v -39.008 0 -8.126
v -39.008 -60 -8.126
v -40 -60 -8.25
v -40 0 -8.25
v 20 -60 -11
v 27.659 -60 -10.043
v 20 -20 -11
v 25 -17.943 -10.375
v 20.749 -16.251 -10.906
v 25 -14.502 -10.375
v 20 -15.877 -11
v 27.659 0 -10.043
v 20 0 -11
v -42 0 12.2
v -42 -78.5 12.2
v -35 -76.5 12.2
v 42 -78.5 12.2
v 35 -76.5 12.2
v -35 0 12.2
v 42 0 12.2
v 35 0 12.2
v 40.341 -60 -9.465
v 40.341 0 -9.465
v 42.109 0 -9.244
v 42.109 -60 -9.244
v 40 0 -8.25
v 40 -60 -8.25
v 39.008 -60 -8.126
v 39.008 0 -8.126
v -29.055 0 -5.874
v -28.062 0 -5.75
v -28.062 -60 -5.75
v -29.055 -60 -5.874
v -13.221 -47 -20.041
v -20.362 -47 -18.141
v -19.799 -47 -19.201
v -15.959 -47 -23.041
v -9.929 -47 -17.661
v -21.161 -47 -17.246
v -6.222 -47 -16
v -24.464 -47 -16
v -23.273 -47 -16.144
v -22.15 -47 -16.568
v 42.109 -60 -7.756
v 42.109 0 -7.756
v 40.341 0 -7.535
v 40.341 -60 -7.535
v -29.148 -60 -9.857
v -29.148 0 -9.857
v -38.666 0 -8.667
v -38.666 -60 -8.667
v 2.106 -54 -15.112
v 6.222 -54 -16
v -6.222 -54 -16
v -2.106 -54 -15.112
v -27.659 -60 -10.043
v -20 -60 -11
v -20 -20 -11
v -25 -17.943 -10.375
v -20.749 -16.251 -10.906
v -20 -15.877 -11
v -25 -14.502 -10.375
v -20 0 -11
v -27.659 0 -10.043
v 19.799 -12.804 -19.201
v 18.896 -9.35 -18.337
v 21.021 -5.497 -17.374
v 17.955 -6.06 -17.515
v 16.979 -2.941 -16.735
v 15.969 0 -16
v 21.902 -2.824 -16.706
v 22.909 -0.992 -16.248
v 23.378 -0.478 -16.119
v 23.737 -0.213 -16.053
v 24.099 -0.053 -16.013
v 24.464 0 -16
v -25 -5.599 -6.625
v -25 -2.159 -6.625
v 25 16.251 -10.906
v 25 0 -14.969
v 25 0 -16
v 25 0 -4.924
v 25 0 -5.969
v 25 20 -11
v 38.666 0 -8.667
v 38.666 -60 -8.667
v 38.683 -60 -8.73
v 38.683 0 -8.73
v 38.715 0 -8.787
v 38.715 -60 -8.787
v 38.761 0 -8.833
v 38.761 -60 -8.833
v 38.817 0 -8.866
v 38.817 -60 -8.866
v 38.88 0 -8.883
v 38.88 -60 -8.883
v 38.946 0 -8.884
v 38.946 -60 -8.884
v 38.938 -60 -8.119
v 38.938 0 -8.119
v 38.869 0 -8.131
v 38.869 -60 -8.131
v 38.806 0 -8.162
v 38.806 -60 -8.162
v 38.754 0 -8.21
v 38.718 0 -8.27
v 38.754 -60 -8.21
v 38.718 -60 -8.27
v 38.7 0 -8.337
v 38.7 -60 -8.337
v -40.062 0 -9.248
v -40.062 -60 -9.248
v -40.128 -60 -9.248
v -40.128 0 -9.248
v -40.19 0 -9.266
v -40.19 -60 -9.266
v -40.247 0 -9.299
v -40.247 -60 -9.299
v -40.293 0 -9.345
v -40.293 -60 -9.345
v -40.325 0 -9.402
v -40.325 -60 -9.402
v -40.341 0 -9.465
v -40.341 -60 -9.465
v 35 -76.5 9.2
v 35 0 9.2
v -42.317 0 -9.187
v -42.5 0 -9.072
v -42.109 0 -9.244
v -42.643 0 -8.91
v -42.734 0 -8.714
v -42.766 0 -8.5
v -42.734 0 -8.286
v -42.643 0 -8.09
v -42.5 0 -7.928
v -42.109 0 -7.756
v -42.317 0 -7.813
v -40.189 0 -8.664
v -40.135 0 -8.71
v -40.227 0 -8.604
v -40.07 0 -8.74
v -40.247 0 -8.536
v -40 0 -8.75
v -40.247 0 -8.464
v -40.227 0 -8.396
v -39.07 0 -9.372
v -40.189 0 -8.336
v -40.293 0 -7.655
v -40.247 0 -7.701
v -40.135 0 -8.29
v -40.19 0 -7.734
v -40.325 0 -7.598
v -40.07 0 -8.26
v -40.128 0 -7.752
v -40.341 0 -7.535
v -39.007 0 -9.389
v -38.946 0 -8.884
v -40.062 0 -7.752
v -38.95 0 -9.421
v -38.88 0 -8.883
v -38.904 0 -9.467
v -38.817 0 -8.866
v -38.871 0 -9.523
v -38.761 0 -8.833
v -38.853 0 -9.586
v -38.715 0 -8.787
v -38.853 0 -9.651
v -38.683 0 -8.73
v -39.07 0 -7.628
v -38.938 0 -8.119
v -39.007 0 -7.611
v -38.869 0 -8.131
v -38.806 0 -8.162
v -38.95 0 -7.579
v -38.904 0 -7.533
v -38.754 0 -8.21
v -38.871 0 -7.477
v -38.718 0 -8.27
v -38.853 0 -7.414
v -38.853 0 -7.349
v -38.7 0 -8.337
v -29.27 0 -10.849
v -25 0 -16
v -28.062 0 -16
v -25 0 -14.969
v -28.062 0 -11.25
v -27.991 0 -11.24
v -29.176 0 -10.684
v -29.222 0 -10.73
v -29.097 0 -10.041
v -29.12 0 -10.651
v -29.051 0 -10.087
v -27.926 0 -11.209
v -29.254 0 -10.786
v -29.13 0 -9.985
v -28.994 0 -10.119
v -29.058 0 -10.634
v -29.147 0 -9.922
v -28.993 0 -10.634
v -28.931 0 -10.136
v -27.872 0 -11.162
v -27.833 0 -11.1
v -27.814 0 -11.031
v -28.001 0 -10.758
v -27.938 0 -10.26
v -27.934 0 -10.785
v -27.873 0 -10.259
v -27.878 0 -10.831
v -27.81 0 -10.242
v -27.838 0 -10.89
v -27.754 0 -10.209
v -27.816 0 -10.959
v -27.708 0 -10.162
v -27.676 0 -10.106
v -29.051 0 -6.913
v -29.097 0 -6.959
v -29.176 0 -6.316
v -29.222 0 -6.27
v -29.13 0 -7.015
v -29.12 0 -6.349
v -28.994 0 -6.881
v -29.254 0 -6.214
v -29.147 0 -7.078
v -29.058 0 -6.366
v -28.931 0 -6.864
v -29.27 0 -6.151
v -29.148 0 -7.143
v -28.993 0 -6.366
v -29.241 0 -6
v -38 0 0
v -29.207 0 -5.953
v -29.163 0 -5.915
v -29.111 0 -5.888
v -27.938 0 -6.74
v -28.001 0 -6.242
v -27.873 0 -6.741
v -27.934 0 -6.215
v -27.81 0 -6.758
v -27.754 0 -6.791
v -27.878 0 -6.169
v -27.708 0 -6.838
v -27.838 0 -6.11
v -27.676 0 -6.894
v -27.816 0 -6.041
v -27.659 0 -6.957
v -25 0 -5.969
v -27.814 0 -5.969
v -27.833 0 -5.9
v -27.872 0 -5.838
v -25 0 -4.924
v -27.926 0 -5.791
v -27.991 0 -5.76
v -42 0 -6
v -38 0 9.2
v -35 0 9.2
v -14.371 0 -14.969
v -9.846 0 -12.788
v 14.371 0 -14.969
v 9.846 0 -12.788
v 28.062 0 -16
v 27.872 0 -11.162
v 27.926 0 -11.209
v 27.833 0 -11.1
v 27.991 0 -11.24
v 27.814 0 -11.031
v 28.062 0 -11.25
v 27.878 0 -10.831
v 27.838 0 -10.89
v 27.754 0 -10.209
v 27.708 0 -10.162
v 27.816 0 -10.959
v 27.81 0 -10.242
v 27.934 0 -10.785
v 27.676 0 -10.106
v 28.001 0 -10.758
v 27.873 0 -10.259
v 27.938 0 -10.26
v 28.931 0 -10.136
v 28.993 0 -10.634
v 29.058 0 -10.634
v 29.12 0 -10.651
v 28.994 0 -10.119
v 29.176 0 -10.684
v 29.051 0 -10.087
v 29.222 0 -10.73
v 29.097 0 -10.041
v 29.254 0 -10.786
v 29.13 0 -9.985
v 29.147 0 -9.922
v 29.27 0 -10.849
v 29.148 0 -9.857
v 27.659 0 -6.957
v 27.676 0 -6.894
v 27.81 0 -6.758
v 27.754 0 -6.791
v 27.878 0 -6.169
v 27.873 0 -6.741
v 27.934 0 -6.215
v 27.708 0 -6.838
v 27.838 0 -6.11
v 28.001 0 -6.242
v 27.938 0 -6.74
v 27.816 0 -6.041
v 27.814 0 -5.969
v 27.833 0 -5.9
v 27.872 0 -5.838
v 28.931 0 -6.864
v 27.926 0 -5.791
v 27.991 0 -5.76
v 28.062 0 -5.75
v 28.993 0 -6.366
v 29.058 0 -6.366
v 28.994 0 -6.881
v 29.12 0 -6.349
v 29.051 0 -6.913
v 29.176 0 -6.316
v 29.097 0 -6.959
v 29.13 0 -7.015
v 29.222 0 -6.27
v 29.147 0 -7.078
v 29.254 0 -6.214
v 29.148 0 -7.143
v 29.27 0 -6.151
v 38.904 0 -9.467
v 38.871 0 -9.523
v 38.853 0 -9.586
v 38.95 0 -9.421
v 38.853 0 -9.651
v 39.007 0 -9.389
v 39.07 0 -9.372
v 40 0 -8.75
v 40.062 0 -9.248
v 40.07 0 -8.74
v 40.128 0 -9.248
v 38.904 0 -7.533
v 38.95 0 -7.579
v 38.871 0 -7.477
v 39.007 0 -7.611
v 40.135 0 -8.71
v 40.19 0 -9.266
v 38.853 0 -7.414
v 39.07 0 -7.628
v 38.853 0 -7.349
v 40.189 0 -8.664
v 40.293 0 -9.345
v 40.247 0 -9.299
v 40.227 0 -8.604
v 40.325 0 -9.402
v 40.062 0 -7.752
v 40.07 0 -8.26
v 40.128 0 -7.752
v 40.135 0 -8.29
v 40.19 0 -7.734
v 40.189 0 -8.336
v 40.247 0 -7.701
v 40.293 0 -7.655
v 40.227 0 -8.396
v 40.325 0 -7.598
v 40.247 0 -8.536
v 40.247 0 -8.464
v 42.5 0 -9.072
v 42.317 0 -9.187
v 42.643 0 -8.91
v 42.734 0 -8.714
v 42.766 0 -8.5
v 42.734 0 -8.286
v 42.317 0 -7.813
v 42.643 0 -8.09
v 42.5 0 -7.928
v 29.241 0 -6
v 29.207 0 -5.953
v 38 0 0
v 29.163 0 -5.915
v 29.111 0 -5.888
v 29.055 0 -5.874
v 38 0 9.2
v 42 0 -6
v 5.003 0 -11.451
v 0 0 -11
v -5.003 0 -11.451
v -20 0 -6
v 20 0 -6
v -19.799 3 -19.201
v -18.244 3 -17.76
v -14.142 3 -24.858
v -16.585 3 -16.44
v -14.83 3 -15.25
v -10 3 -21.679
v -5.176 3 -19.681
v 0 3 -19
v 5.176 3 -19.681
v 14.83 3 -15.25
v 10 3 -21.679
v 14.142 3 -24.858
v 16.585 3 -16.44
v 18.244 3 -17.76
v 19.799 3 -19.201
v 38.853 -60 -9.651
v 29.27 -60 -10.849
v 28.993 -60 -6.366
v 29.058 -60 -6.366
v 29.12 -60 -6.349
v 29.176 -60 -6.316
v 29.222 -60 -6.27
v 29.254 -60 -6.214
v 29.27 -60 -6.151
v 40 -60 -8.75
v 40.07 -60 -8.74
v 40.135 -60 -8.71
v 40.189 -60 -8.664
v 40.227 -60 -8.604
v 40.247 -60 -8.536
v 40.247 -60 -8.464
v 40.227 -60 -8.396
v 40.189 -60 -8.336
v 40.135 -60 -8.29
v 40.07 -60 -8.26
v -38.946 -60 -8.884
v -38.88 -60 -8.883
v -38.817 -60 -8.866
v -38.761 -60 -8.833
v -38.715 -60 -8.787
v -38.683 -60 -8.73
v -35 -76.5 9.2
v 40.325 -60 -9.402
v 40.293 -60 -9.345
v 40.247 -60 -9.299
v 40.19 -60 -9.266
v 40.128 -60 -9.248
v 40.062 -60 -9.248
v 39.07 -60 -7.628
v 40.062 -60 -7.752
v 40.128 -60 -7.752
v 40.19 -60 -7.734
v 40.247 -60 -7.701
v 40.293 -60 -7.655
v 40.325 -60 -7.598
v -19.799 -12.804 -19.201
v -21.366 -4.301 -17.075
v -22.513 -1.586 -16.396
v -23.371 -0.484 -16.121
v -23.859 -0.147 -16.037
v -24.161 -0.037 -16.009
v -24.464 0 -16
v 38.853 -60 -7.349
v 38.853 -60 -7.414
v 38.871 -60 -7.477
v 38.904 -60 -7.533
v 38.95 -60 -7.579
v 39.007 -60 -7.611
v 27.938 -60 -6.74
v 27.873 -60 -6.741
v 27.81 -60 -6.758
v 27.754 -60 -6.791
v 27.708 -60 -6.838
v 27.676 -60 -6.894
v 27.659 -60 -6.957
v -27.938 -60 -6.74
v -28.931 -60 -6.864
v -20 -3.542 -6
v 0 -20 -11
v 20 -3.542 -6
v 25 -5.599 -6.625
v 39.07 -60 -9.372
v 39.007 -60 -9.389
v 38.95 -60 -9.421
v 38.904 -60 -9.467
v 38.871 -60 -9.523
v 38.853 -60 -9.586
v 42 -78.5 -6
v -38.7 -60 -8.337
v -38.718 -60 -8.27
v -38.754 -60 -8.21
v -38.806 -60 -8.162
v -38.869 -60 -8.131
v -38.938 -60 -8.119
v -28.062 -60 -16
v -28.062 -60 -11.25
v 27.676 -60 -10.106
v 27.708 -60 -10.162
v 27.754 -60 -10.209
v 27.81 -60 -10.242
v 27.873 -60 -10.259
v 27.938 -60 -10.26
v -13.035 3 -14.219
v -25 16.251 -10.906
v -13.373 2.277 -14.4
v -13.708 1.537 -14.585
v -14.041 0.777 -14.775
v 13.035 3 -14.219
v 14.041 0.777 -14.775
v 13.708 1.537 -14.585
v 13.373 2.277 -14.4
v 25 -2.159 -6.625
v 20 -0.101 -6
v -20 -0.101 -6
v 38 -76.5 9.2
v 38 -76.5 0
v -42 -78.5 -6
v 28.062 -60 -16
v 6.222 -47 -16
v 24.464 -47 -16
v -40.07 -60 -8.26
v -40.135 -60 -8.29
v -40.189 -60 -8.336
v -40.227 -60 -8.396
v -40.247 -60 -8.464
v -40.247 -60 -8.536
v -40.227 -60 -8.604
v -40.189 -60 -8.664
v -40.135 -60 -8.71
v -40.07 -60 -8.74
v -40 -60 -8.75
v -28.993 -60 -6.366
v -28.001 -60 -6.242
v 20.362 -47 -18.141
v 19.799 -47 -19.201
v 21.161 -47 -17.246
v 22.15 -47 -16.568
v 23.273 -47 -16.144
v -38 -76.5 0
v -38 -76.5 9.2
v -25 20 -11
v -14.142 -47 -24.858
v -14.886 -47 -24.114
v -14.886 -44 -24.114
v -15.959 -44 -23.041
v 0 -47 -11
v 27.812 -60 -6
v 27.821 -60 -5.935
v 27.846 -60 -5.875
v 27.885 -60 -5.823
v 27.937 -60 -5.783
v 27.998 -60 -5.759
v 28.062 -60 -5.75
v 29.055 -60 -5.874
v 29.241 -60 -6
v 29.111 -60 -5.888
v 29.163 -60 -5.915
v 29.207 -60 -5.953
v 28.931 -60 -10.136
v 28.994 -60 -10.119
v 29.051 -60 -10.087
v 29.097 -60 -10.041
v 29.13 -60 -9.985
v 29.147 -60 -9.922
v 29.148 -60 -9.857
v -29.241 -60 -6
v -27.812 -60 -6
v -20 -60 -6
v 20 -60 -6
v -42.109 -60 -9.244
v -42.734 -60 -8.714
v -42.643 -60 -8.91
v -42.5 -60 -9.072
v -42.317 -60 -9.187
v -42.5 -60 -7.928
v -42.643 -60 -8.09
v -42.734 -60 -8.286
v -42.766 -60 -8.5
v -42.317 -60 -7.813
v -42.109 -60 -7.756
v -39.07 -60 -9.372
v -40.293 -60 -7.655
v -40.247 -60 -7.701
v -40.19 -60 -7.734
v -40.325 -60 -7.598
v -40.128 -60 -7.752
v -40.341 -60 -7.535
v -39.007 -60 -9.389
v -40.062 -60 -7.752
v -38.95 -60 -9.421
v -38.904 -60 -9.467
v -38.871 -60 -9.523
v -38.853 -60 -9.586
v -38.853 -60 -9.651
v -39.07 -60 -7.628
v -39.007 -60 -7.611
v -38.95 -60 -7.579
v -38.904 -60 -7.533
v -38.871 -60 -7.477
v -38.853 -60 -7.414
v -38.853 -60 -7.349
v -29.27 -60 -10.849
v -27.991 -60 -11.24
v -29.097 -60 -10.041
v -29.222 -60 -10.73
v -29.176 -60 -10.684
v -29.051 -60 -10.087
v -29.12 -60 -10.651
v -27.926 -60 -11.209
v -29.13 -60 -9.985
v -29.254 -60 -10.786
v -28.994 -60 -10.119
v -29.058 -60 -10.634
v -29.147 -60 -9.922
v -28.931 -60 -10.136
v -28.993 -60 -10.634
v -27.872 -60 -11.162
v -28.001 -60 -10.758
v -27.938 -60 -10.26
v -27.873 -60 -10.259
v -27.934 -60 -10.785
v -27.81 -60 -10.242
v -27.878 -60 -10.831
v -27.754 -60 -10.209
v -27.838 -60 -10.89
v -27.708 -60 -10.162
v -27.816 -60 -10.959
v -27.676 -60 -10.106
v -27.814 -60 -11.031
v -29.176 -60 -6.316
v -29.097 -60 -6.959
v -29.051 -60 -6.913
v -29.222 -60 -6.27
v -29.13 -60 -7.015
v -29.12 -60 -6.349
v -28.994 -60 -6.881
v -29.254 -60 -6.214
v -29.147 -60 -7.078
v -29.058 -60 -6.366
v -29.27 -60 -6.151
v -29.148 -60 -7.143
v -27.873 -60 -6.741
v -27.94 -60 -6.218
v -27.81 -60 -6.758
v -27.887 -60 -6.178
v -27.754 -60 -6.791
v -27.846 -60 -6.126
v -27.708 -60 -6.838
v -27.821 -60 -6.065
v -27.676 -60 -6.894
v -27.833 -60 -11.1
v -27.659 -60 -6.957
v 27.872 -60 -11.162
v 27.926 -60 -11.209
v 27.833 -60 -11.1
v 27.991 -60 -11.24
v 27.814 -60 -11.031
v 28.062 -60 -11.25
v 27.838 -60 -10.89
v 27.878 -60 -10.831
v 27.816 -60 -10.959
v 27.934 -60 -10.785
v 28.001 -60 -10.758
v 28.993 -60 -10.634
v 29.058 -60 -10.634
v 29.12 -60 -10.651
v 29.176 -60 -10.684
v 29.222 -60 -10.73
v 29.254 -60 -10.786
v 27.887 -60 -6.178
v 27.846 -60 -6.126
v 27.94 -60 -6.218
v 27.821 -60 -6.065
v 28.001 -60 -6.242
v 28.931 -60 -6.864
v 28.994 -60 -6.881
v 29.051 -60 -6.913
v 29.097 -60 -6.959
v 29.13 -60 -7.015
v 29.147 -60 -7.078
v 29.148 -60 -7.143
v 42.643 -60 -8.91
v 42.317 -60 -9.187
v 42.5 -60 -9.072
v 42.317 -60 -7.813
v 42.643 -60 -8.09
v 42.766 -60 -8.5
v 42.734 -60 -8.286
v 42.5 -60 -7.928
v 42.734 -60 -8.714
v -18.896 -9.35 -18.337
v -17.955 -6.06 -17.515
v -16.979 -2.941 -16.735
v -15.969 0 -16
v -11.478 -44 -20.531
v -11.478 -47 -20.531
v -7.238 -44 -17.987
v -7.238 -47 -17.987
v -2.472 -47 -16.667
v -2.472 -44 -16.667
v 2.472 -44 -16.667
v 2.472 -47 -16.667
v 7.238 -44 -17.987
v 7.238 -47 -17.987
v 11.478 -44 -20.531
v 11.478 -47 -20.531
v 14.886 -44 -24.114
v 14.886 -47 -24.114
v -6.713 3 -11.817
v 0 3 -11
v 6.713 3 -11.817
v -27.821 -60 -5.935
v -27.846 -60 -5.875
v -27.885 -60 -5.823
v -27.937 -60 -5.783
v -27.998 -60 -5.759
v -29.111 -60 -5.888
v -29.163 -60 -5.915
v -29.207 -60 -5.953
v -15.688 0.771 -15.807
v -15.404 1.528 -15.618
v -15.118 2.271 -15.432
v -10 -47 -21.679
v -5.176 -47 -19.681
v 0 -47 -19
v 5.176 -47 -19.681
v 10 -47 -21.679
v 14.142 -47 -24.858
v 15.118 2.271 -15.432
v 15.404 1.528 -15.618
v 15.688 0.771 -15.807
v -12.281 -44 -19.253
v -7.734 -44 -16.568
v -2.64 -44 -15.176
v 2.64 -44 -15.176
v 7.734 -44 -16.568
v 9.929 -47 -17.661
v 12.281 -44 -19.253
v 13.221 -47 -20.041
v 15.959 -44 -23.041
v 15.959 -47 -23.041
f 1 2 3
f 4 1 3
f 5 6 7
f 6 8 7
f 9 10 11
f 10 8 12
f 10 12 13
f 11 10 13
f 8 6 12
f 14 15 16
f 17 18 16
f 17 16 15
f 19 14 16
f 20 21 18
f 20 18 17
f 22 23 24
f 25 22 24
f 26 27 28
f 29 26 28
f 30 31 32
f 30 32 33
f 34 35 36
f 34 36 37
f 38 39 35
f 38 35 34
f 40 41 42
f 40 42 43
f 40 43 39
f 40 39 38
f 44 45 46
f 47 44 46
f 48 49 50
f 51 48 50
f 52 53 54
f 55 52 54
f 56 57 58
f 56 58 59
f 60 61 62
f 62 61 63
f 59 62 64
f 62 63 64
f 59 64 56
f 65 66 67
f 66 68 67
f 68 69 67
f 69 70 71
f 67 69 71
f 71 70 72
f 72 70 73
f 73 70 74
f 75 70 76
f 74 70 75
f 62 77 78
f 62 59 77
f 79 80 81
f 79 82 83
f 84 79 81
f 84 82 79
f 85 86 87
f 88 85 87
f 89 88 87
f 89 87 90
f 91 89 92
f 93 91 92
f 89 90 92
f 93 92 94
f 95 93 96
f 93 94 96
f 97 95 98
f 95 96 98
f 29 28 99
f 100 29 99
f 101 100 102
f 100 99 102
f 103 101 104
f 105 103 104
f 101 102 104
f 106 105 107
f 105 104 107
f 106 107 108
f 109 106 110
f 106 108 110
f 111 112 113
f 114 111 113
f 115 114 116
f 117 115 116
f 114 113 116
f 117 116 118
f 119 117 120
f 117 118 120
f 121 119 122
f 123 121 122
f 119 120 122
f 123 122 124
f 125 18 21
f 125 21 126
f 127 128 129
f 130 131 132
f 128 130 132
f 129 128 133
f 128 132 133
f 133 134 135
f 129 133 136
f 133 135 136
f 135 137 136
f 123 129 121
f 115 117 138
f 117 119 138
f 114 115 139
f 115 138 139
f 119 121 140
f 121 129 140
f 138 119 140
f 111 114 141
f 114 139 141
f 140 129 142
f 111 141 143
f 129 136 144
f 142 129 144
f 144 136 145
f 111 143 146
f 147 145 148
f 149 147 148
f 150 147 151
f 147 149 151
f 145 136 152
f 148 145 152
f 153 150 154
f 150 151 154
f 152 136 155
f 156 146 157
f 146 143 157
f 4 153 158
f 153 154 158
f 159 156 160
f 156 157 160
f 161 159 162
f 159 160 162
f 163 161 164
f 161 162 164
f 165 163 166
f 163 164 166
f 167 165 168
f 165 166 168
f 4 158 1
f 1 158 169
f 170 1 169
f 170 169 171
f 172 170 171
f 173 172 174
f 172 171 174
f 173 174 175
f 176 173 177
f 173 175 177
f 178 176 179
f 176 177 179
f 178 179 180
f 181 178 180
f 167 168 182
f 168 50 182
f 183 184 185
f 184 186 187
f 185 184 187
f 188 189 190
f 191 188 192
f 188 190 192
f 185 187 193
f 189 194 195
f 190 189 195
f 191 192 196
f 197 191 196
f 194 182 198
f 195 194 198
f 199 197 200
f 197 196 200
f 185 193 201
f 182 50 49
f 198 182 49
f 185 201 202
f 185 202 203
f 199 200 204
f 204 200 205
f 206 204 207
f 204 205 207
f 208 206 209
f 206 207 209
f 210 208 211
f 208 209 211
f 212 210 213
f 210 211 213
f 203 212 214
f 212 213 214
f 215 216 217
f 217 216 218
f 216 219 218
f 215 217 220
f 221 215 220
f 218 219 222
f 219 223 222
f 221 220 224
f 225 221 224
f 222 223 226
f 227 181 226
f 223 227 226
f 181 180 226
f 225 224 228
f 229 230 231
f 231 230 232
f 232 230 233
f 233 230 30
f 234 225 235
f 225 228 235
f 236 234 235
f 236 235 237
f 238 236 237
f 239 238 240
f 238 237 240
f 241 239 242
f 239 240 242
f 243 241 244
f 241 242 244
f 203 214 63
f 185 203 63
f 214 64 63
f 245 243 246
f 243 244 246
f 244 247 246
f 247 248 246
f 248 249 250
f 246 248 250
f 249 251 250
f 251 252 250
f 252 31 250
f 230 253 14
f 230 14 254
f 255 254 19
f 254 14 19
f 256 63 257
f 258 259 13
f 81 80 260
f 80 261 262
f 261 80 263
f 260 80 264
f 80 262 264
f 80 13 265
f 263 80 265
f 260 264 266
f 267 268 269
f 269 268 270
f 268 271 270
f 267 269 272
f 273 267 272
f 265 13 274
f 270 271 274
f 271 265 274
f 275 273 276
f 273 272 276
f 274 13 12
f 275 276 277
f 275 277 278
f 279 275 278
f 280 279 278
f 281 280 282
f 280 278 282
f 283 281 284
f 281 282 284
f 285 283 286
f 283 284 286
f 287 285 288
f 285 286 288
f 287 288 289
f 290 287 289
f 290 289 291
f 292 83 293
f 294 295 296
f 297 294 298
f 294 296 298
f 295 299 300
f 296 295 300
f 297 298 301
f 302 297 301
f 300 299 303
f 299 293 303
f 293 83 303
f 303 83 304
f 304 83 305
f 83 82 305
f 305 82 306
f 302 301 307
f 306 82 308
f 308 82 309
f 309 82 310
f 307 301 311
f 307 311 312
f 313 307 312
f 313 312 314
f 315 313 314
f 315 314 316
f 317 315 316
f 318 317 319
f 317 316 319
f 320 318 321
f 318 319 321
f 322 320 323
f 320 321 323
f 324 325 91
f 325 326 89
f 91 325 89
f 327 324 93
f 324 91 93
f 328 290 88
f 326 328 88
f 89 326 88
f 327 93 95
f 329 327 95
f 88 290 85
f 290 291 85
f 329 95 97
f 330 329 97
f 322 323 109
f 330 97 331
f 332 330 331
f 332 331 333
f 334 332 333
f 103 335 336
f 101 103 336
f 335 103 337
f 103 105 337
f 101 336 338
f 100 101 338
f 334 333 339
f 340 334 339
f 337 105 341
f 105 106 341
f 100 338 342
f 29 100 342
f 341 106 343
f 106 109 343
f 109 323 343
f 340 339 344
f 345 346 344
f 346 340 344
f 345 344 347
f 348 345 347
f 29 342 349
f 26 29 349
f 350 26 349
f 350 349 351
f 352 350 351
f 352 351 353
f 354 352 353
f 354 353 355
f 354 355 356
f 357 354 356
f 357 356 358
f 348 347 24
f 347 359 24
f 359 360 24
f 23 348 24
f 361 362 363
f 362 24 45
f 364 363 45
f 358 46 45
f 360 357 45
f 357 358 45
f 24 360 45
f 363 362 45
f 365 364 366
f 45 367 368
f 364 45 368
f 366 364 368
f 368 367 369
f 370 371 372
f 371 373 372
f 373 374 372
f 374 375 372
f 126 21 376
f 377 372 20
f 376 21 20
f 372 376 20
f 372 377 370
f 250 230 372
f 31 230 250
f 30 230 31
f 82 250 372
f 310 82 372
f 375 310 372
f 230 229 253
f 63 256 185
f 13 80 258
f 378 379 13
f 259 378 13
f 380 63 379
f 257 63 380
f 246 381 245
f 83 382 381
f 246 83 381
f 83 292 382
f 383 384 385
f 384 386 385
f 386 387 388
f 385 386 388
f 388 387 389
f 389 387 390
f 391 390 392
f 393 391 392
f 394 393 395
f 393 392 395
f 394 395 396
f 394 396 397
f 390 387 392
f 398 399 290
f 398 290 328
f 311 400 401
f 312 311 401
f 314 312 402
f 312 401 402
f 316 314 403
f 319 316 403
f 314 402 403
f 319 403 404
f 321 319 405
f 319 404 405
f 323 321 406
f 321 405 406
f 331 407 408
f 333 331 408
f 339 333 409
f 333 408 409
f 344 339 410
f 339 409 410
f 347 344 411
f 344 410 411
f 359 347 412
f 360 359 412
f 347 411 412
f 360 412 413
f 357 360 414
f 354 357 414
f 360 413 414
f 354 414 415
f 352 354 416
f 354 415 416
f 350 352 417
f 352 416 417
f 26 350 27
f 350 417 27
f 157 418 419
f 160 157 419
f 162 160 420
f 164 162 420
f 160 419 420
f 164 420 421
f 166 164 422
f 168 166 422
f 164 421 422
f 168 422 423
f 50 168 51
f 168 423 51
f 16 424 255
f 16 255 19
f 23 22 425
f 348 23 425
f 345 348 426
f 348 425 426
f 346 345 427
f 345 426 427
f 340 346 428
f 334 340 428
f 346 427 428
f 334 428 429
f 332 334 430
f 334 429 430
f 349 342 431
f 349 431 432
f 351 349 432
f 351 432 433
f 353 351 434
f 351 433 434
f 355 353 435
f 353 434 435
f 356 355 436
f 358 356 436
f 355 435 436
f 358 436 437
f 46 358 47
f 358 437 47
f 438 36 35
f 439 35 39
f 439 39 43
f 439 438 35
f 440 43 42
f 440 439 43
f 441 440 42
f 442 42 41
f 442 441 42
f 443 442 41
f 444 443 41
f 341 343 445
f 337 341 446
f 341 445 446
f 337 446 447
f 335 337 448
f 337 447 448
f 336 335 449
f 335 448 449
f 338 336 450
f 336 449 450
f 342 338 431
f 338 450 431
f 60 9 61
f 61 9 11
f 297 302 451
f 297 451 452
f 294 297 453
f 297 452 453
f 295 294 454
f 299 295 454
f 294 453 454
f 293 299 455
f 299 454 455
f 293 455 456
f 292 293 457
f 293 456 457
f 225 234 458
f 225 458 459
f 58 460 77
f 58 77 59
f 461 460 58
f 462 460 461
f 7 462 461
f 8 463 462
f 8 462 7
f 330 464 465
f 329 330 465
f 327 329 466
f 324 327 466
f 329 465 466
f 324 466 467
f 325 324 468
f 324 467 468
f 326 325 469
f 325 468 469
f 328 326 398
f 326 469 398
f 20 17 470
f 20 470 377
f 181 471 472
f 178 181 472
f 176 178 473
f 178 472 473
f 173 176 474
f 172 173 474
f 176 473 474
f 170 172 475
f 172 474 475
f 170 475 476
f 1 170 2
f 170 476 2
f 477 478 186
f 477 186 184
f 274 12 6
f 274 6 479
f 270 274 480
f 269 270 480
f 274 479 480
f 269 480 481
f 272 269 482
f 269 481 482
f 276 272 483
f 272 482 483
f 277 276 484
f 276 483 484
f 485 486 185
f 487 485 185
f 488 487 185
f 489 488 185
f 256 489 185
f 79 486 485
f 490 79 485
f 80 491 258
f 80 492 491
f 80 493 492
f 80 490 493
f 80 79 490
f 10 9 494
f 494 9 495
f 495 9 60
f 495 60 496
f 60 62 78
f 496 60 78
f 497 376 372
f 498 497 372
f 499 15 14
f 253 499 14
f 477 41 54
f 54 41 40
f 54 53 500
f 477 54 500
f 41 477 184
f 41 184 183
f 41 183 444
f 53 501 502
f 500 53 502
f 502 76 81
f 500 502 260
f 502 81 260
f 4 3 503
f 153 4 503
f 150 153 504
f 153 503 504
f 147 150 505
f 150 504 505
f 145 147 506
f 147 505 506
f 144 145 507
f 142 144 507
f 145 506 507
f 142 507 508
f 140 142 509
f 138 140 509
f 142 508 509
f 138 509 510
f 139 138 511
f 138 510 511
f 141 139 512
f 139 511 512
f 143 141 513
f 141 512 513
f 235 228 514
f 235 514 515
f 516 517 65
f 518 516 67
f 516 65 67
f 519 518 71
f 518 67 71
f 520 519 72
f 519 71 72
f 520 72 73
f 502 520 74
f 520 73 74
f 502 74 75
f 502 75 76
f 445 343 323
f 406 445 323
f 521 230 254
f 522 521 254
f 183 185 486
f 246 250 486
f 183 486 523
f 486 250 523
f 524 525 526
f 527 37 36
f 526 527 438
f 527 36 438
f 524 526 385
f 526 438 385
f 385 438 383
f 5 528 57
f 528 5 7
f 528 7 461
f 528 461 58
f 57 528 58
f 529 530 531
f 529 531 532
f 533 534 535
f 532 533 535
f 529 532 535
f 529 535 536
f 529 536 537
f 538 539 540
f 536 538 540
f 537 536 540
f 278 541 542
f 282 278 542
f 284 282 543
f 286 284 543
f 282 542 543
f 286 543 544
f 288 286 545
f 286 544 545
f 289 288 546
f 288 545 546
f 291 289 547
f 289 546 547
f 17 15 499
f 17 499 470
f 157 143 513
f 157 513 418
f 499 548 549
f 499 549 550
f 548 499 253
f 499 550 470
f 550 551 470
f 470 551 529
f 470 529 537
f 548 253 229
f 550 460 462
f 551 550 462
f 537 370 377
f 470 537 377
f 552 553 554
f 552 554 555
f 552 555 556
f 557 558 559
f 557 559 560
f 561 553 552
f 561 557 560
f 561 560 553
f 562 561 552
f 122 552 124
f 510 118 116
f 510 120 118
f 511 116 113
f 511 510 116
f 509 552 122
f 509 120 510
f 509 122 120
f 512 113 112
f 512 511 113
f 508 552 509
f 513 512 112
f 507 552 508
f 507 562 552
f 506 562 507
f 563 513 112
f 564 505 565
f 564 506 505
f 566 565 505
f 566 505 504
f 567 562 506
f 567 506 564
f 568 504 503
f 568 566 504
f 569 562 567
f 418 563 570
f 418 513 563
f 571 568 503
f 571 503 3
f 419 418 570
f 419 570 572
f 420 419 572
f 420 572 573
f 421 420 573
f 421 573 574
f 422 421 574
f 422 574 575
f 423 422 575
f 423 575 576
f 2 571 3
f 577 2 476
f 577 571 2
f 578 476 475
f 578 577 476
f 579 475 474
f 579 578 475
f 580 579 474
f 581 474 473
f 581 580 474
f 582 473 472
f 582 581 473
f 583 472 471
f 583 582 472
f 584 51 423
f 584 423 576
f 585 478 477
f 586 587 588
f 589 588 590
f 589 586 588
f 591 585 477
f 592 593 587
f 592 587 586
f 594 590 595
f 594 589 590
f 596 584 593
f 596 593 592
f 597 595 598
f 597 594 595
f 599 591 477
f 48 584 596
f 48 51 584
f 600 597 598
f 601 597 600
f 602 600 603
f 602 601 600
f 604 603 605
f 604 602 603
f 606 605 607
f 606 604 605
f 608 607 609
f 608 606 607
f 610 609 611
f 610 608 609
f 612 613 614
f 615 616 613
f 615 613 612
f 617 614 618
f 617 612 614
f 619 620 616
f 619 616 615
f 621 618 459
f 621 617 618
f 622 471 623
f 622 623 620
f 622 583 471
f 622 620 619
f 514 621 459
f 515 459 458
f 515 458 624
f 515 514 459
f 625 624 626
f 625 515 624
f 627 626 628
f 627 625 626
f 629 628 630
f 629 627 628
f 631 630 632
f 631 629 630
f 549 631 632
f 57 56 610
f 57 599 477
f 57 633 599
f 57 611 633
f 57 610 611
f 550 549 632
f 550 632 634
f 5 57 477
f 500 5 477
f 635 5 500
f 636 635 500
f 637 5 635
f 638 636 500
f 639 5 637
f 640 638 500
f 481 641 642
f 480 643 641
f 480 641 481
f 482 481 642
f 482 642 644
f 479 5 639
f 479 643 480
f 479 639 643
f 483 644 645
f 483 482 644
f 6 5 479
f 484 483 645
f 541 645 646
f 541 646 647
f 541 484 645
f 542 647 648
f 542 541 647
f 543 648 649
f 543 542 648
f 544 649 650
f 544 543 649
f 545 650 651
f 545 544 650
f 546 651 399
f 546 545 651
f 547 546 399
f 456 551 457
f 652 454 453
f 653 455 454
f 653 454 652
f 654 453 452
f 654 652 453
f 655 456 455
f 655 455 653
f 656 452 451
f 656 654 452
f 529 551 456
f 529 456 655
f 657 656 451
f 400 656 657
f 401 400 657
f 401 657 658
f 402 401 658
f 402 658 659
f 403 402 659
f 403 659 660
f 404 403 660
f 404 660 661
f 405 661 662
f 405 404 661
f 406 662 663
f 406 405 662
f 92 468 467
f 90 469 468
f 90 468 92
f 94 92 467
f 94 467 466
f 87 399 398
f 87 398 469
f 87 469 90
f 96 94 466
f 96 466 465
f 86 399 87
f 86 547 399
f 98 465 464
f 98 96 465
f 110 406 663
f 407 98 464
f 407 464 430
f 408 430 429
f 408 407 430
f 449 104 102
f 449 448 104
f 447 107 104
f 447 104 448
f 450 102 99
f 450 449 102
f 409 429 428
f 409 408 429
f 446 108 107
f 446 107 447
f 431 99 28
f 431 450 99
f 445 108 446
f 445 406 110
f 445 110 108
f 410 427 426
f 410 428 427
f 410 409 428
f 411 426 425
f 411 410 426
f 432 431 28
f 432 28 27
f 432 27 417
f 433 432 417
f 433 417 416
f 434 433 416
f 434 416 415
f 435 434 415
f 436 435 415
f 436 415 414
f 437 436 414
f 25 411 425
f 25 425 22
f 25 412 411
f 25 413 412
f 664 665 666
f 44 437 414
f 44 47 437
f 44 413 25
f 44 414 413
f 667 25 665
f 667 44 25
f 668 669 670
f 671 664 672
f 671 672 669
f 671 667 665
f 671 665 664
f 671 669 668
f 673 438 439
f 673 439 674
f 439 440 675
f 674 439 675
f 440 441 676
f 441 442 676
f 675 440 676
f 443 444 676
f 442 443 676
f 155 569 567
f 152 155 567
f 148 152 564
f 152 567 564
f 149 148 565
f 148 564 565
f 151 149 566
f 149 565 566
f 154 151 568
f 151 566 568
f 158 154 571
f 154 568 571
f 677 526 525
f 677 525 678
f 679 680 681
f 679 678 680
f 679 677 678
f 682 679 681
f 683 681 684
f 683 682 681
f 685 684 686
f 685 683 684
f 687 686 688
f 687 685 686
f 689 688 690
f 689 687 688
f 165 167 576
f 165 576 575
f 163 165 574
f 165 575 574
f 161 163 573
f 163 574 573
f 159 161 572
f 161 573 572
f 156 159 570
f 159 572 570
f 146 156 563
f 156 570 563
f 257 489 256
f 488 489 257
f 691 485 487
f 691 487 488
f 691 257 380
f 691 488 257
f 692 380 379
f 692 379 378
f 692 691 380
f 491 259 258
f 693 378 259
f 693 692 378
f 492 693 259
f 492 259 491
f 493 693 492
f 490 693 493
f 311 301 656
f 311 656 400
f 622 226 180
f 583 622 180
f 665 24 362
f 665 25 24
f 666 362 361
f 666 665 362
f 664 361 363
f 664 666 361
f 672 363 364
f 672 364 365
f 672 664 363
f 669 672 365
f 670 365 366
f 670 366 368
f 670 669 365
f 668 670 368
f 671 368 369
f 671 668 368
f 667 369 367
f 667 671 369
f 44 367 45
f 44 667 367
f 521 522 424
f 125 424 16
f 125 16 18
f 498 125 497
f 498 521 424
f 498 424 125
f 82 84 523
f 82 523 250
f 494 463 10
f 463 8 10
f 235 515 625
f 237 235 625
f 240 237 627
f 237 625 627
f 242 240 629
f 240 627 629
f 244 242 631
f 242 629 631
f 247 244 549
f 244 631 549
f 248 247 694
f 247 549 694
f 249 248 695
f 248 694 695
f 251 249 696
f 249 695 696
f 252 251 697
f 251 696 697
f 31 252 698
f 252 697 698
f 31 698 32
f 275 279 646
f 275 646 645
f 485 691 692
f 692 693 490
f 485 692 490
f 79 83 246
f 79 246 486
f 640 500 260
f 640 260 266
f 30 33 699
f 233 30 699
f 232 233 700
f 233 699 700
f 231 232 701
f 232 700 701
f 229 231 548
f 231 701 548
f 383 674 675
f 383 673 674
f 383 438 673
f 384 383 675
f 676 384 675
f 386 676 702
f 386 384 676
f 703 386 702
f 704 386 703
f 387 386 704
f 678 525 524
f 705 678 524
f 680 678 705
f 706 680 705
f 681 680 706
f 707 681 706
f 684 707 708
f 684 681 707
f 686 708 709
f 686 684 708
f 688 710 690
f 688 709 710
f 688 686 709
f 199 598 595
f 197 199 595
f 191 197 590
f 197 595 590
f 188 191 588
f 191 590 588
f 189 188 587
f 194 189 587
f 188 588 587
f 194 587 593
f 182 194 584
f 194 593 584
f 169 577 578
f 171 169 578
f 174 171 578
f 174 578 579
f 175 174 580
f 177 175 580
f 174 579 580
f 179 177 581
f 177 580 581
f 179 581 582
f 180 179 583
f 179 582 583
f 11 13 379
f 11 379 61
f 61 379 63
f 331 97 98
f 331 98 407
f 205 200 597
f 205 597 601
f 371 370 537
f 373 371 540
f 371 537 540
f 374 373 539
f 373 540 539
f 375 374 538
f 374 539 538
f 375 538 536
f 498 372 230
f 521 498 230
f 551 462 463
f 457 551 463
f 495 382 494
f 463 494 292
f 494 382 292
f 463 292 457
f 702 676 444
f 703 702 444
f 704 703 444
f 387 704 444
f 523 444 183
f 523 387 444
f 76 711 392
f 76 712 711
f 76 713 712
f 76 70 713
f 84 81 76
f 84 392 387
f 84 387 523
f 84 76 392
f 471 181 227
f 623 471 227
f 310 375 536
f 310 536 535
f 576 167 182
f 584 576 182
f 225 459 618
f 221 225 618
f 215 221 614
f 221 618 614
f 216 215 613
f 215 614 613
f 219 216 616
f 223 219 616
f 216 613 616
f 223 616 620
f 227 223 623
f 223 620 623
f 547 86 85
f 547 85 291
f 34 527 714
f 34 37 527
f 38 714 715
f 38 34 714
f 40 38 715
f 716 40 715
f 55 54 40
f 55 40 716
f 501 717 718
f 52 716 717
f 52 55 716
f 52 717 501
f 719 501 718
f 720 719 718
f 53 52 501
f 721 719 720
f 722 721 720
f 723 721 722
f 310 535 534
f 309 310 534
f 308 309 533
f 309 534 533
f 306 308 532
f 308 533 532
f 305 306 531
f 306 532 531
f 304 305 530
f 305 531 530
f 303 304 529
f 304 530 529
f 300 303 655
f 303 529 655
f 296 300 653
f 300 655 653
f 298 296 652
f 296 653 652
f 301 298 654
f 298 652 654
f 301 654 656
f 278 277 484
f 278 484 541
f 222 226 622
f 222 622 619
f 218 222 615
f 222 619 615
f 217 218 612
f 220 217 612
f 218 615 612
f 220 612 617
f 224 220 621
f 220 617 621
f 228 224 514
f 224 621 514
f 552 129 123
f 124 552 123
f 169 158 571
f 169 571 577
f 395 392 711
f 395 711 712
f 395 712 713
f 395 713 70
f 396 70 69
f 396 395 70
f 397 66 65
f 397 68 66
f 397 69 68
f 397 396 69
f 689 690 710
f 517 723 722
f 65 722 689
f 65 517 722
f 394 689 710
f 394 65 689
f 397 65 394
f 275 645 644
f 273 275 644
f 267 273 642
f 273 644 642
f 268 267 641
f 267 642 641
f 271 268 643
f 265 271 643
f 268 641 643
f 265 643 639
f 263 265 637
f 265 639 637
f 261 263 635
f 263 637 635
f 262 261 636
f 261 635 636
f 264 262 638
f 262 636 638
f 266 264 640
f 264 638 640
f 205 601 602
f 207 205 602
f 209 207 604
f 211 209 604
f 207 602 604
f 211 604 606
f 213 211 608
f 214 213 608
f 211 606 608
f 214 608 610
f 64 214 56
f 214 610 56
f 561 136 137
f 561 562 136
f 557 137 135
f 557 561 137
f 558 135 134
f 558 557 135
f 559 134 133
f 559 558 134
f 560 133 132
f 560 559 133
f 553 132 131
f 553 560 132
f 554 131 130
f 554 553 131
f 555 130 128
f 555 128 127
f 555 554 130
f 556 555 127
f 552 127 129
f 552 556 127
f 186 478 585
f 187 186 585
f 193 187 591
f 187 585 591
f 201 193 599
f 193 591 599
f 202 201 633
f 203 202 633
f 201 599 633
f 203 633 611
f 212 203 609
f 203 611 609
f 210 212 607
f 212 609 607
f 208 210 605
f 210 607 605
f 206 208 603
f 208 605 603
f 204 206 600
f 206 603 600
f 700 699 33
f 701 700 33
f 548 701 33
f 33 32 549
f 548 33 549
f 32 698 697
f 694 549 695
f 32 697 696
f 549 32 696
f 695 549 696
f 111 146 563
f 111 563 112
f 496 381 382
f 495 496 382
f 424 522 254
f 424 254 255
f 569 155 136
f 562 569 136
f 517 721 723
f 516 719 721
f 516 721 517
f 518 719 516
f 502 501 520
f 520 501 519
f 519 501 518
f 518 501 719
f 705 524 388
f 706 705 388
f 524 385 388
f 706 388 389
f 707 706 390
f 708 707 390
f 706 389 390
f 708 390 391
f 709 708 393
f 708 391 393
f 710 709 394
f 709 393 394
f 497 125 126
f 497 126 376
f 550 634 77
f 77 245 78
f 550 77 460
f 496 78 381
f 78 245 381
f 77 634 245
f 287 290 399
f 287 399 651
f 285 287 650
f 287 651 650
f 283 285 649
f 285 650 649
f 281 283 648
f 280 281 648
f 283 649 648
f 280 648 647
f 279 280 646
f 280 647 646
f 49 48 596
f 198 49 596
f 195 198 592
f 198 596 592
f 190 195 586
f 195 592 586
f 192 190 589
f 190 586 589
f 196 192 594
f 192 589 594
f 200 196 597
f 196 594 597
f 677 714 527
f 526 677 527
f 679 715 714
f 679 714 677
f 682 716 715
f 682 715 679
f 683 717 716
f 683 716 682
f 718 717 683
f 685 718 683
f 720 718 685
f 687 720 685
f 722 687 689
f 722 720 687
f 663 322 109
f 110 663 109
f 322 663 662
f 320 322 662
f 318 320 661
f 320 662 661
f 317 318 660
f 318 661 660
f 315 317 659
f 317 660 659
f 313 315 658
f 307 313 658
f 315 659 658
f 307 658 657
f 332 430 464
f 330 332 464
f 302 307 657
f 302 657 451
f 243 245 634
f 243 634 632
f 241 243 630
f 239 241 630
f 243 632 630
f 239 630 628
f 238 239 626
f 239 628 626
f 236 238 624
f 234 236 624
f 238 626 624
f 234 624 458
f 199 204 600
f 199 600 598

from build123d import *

# Parameters (mm, degrees)
F1_DEPTH      = 76.5
F3_DEPTH      = 60
F4_W          = 84
F4_H          = 2
F5_DEPTH      = 12.2
F5_DEPTH_BACK = 6
F7_DEPTH      = 25
F7_DEPTH_BACK = 25
F8_W          = 50
F8_H          = 8
F9_ANGLE_BACK = 45
F9_ANGLE      = 90
F10_T4_DEPTH  = 68.2385540506
F10_T9_DEPTH  = 68.2385540506
F11_W         = 5
F11_H         = 1.5
F14_DEPTH     = 60
F15_F1_R      = 0.75
F15_F2_R      = 0.75


# Not quite as in the source:
# - a fillet or chamfer that OpenCascade refuses, or shapes differently, is made with other operations: its cross-section is extruded or revolved along the edge and cut away or added


with BuildPart() as f1:
    # F0 (on Front) → F1 (new body)
    with BuildSketch(Plane.XZ):
        Polygon((-35, 9.2), (-35, 12.2), (-42, 12.2), (-42, -6), (0, -6), (42, -6), (42, 12.2), (35, 12.2), (35, 9.2), (38, 9.2), (38, 0), (0, 0), (-38, 0), (-38, 9.2), align=None)
    extrude(amount=F1_DEPTH)

    # F2 (on Front) → F3 (join)
    with BuildSketch(Plane.XZ):
        Polygon((-40, -8.5), (-20, -6), (-28.0622577483, -6), (-48.0622577483, -8.5), (-28.0622577483, -11), (-28.0622577483, -16), (0, -16), (28.0622577483, -16), (28.0622577483, -11), (48.0622577483, -8.5), (28.0622577483, -6), (20, -6), (40, -8.5), (20, -11), (0, -11), (-20, -11), align=None)
    extrude(amount=F3_DEPTH)

    # F4 (on face) → F5 (join, two sides)
    with BuildSketch(Plane.XY) as f5_sk:
        with Locations((0, -77.5)):
            Rectangle(F4_W, F4_H)
    extrude(amount=F5_DEPTH)
    extrude(f5_sk.sketch, amount=-F5_DEPTH_BACK)

    # F6 (on Right) → F7 (join, two sides)
    with BuildSketch(Plane.YZ) as f7_sk:
        Polygon((0, -14.9692235936), (0, -16), (20, -11), (0, -4.9240960793), (0, -5.9692235936), (16.2514952539, -10.9063497801), align=None)
        Polygon((-20, -11), (0, -16), (0, -14.9692235936), (-16.2514952539, -10.9063497801), (0, -5.9692235936), (0, -4.9240960793), align=None)
    extrude(amount=F7_DEPTH)
    extrude(f7_sk.sketch, amount=-F7_DEPTH_BACK)

    # F8 (on Right) → F9 (revolve)
    with BuildSketch(Plane.YZ, mode=Mode.PRIVATE) as f9_sk:
        with Locations((-22, -15)):
            Rectangle(F8_W, F8_H)
    revolve(f9_sk.sketch.rotate(Axis((0, -22, -39), (0, 1, 0)), -F9_ANGLE_BACK), axis=Axis((0, -22, -39), (0, 1, 0)), revolution_arc=F9_ANGLE)

    # F10: fillet of radius 5 on 2 edges, made by hand


with BuildPart() as f10_tool2:
    # F10_s3 → F10_t4 (new body)
    with BuildSketch(Plane.XZ.offset(-21.2385540506)):
        with BuildLine():
            ThreePointArc((-19.7989898732, -19.2010101268), (-21.6352675362, -16.8772006254), (-24.4641410429, -16))
            Line((-24.4641410429, -16), (-15.9687194227, -16))
            ThreePointArc((-15.9687194227, -16), (-17.9553299476, -17.5149790209), (-19.7989898732, -19.2010101268))
        make_face()
    extrude(amount=F10_T4_DEPTH)

    split(bisect_by=Plane(origin=(0, 3.7647058824, -15.0588235294), x_dir=(1, 0, 0), z_dir=(0, -0.242535625, 0.9701425001)), keep=Keep.TOP)


with BuildPart() as f1_1:
    add(f1.part)

    # F10_t1: union F10_tool2
    add(f10_tool2.part)


with BuildPart() as f10_tool7:
    # F10_s8 → F10_t9 (new body)
    with BuildSketch(Plane.XZ.offset(-21.2385540506)):
        with BuildLine():
            ThreePointArc((19.7989898732, -19.2010101268), (21.6352675362, -16.8772006254), (24.4641410429, -16))
            Line((24.4641410429, -16), (15.9687194227, -16))
            ThreePointArc((15.9687194227, -16), (17.9553299476, -17.5149790209), (19.7989898732, -19.2010101268))
        make_face()
    extrude(amount=F10_T9_DEPTH)

    split(bisect_by=Plane(origin=(0, 3.7647058824, -15.0588235294), x_dir=(1, 0, 0), z_dir=(0, -0.242535625, 0.9701425001)), keep=Keep.TOP)


with BuildPart() as f1_2:
    add(f1_1.part)

    # F10_t6: union F10_tool7
    add(f10_tool7.part)

    # F11 (on Right) → F12 (revolve, cut)
    with BuildSketch(Plane.YZ):
        with Locations((-51.5, -15.75)):
            Rectangle(F11_W, F11_H)
        with Locations((-46.5, -15.75)):
            Rectangle(F11_W, F11_H)
    revolve(axis=Axis((0, -22, -34.8578643763), (0, 1, 0)), mode=Mode.SUBTRACT)

    # F13 (on face) → F14 (cut, through all)
    with BuildSketch(Plane.XZ.offset(60)):
        with BuildLine():
            Line((38.9456393414, -8.8837402215), (40, -8.75))
            ThreePointArc((40, -8.75), (40.25, -8.5), (40, -8.25))
            Line((40, -8.25), (39.0077436029, -8.1257935491))
            ThreePointArc((39.0077436029, -8.1257935491), (38.8060744602, -8.1623581433), (38.6995205721, -8.3374400715))
            Line((38.6995205721, -8.3374400715), (38.6661107322, -8.6047187912))
            ThreePointArc((38.6661107322, -8.6047187912), (38.737564097, -8.8126646153), (38.9456393414, -8.8837402215))
        make_face()
        with BuildLine():
            Line((39.0699789435, -7.627910704), (40.0622568202, -7.7519454386))
            ThreePointArc((40.0622568202, -7.7519454386), (40.341334973, -7.5348846531), (40.1242741875, -7.2558065003))
            Line((40.1242741875, -7.2558065003), (39.1319963108, -7.1317717657))
            ThreePointArc((39.1319963108, -7.1317717657), (38.8529181579, -7.3488325512), (39.0699789435, -7.627910704))
        make_face()
        with BuildLine():
            Line((29.054535625, -5.8740347346), (28.0622577483, -5.75))
            ThreePointArc((28.0622577483, -5.75), (27.8141882791, -5.9689913164), (28.0007192868, -6.2423076923))
            Line((28.0007192868, -6.2423076923), (28.9929971635, -6.3663424269))
            ThreePointArc((28.9929971635, -6.3663424269), (29.2699202404, -6.1509578115), (29.054535625, -5.8740347346))
        make_face()
        with BuildLine():
            Line((28.9307403433, -6.8643969883), (27.9384624666, -6.7403622537))
            ThreePointArc((27.9384624666, -6.7403622537), (27.6593843138, -6.9574230392), (27.8764450993, -7.236501192))
            Line((27.8764450993, -7.236501192), (28.868722976, -7.3605359266))
            ThreePointArc((28.868722976, -7.3605359266), (29.1478011288, -7.1434751411), (28.9307403433, -6.8643969883))
        make_face()
        with BuildLine():
            ThreePointArc((39.0699789435, -9.372089296), (38.8529181579, -9.6511674488), (39.1319963108, -9.8682282343))
            Line((39.1319963108, -9.8682282343), (40.1242741875, -9.7441934997))
            ThreePointArc((40.1242741875, -9.7441934997), (40.341334973, -9.4651153469), (40.0622568202, -9.2480545614))
            Line((40.0622568202, -9.2480545614), (39.0699789435, -9.372089296))
        make_face()
        with BuildLine():
            Line((27.9384624666, -10.2596377463), (28.9307403433, -10.1356030117))
            ThreePointArc((28.9307403433, -10.1356030117), (29.1478011288, -9.8565248589), (28.868722976, -9.6394640734))
            Line((28.868722976, -9.6394640734), (27.8764450993, -9.763498808))
            ThreePointArc((27.8764450993, -9.763498808), (27.6593843138, -10.0425769608), (27.9384624666, -10.2596377463))
        make_face()
        with BuildLine():
            ThreePointArc((28.0007192868, -10.7576923077), (27.8141882791, -11.0310086836), (28.0622577483, -11.25))
            Line((28.0622577483, -11.25), (29.054535625, -11.1259652654))
            ThreePointArc((29.054535625, -11.1259652654), (29.2699202404, -10.8490421885), (28.9929971635, -10.6336575731))
            Line((28.9929971635, -10.6336575731), (28.0007192868, -10.7576923077))
        make_face()
        with BuildLine():
            Line((-38.6661107322, -8.6047187912), (-38.6995205721, -8.3374400715))
            ThreePointArc((-38.6995205721, -8.3374400715), (-38.8060744602, -8.1623581433), (-39.0077436029, -8.1257935491))
            Line((-39.0077436029, -8.1257935491), (-40, -8.25))
            ThreePointArc((-40, -8.25), (-40.25, -8.5), (-40, -8.75))
            Line((-40, -8.75), (-38.9456393414, -8.8837402215))
            ThreePointArc((-38.9456393414, -8.8837402215), (-38.737564097, -8.8126646153), (-38.6661107322, -8.6047187912))
        make_face()
        with BuildLine():
            Line((-40.0622568202, -7.7519454386), (-39.0699789435, -7.627910704))
            ThreePointArc((-39.0699789435, -7.627910704), (-38.8529181579, -7.3488325512), (-39.1319963108, -7.1317717657))
            Line((-39.1319963108, -7.1317717657), (-40.1242741875, -7.2558065003))
            ThreePointArc((-40.1242741875, -7.2558065003), (-40.341334973, -7.5348846531), (-40.0622568202, -7.7519454386))
        make_face()
        with BuildLine():
            ThreePointArc((-39.1319963108, -9.8682282343), (-38.8529181579, -9.6511674488), (-39.0699789435, -9.372089296))
            Line((-39.0699789435, -9.372089296), (-40.0622568202, -9.2480545614))
            ThreePointArc((-40.0622568202, -9.2480545614), (-40.341334973, -9.4651153469), (-40.1242741875, -9.7441934997))
            Line((-40.1242741875, -9.7441934997), (-39.1319963108, -9.8682282343))
        make_face()
        with BuildLine():
            ThreePointArc((-28.0007192868, -6.2423076923), (-27.8141882791, -5.9689913164), (-28.0622577483, -5.75))
            Line((-28.0622577483, -5.75), (-29.054535625, -5.8740347346))
            ThreePointArc((-29.054535625, -5.8740347346), (-29.2699202404, -6.1509578115), (-28.9929971635, -6.3663424269))
            Line((-28.9929971635, -6.3663424269), (-28.0007192868, -6.2423076923))
        make_face()
        with BuildLine():
            ThreePointArc((-27.9384624666, -10.2596377463), (-27.6593843138, -10.0425769608), (-27.8764450993, -9.763498808))
            Line((-27.8764450993, -9.763498808), (-28.868722976, -9.6394640734))
            ThreePointArc((-28.868722976, -9.6394640734), (-29.1478011288, -9.8565248589), (-28.9307403433, -10.1356030117))
            Line((-28.9307403433, -10.1356030117), (-27.9384624666, -10.2596377463))
        make_face()
        with BuildLine():
            ThreePointArc((-28.0622577483, -11.25), (-27.8141882791, -11.0310086836), (-28.0007192868, -10.7576923077))
            Line((-28.0007192868, -10.7576923077), (-28.9929971635, -10.6336575731))
            ThreePointArc((-28.9929971635, -10.6336575731), (-29.2699202404, -10.8490421885), (-29.054535625, -11.1259652654))
            Line((-29.054535625, -11.1259652654), (-28.0622577483, -11.25))
        make_face()
        with BuildLine():
            ThreePointArc((-27.8764450993, -7.236501192), (-27.6593843138, -6.9574230392), (-27.9384624666, -6.7403622537))
            Line((-27.9384624666, -6.7403622537), (-28.9307403433, -6.8643969883))
            ThreePointArc((-28.9307403433, -6.8643969883), (-29.1478011288, -7.1434751411), (-28.868722976, -7.3605359266))
            Line((-28.868722976, -7.3605359266), (-27.8764450993, -7.236501192))
        make_face()
    extrude(amount=-F14_DEPTH, mode=Mode.SUBTRACT)

    # F15: fillet of radius 0.75 on 2 edges, made by hand

    # F15_f1
    f15_f1_edges = [f1_2.edges().sort_by_distance(p)[0] for p in [
        (-48.0622577483, -30, -8.5),
    ]]
    fillet(f15_f1_edges, radius=F15_F1_R)

    # F15_f2
    f15_f2_edges = [f1_2.edges().sort_by_distance(p)[0] for p in [
        (48.0622577483, -30, -8.5),
    ]]
    fillet(f15_f2_edges, radius=F15_F2_R)


solid = f1_2.part
